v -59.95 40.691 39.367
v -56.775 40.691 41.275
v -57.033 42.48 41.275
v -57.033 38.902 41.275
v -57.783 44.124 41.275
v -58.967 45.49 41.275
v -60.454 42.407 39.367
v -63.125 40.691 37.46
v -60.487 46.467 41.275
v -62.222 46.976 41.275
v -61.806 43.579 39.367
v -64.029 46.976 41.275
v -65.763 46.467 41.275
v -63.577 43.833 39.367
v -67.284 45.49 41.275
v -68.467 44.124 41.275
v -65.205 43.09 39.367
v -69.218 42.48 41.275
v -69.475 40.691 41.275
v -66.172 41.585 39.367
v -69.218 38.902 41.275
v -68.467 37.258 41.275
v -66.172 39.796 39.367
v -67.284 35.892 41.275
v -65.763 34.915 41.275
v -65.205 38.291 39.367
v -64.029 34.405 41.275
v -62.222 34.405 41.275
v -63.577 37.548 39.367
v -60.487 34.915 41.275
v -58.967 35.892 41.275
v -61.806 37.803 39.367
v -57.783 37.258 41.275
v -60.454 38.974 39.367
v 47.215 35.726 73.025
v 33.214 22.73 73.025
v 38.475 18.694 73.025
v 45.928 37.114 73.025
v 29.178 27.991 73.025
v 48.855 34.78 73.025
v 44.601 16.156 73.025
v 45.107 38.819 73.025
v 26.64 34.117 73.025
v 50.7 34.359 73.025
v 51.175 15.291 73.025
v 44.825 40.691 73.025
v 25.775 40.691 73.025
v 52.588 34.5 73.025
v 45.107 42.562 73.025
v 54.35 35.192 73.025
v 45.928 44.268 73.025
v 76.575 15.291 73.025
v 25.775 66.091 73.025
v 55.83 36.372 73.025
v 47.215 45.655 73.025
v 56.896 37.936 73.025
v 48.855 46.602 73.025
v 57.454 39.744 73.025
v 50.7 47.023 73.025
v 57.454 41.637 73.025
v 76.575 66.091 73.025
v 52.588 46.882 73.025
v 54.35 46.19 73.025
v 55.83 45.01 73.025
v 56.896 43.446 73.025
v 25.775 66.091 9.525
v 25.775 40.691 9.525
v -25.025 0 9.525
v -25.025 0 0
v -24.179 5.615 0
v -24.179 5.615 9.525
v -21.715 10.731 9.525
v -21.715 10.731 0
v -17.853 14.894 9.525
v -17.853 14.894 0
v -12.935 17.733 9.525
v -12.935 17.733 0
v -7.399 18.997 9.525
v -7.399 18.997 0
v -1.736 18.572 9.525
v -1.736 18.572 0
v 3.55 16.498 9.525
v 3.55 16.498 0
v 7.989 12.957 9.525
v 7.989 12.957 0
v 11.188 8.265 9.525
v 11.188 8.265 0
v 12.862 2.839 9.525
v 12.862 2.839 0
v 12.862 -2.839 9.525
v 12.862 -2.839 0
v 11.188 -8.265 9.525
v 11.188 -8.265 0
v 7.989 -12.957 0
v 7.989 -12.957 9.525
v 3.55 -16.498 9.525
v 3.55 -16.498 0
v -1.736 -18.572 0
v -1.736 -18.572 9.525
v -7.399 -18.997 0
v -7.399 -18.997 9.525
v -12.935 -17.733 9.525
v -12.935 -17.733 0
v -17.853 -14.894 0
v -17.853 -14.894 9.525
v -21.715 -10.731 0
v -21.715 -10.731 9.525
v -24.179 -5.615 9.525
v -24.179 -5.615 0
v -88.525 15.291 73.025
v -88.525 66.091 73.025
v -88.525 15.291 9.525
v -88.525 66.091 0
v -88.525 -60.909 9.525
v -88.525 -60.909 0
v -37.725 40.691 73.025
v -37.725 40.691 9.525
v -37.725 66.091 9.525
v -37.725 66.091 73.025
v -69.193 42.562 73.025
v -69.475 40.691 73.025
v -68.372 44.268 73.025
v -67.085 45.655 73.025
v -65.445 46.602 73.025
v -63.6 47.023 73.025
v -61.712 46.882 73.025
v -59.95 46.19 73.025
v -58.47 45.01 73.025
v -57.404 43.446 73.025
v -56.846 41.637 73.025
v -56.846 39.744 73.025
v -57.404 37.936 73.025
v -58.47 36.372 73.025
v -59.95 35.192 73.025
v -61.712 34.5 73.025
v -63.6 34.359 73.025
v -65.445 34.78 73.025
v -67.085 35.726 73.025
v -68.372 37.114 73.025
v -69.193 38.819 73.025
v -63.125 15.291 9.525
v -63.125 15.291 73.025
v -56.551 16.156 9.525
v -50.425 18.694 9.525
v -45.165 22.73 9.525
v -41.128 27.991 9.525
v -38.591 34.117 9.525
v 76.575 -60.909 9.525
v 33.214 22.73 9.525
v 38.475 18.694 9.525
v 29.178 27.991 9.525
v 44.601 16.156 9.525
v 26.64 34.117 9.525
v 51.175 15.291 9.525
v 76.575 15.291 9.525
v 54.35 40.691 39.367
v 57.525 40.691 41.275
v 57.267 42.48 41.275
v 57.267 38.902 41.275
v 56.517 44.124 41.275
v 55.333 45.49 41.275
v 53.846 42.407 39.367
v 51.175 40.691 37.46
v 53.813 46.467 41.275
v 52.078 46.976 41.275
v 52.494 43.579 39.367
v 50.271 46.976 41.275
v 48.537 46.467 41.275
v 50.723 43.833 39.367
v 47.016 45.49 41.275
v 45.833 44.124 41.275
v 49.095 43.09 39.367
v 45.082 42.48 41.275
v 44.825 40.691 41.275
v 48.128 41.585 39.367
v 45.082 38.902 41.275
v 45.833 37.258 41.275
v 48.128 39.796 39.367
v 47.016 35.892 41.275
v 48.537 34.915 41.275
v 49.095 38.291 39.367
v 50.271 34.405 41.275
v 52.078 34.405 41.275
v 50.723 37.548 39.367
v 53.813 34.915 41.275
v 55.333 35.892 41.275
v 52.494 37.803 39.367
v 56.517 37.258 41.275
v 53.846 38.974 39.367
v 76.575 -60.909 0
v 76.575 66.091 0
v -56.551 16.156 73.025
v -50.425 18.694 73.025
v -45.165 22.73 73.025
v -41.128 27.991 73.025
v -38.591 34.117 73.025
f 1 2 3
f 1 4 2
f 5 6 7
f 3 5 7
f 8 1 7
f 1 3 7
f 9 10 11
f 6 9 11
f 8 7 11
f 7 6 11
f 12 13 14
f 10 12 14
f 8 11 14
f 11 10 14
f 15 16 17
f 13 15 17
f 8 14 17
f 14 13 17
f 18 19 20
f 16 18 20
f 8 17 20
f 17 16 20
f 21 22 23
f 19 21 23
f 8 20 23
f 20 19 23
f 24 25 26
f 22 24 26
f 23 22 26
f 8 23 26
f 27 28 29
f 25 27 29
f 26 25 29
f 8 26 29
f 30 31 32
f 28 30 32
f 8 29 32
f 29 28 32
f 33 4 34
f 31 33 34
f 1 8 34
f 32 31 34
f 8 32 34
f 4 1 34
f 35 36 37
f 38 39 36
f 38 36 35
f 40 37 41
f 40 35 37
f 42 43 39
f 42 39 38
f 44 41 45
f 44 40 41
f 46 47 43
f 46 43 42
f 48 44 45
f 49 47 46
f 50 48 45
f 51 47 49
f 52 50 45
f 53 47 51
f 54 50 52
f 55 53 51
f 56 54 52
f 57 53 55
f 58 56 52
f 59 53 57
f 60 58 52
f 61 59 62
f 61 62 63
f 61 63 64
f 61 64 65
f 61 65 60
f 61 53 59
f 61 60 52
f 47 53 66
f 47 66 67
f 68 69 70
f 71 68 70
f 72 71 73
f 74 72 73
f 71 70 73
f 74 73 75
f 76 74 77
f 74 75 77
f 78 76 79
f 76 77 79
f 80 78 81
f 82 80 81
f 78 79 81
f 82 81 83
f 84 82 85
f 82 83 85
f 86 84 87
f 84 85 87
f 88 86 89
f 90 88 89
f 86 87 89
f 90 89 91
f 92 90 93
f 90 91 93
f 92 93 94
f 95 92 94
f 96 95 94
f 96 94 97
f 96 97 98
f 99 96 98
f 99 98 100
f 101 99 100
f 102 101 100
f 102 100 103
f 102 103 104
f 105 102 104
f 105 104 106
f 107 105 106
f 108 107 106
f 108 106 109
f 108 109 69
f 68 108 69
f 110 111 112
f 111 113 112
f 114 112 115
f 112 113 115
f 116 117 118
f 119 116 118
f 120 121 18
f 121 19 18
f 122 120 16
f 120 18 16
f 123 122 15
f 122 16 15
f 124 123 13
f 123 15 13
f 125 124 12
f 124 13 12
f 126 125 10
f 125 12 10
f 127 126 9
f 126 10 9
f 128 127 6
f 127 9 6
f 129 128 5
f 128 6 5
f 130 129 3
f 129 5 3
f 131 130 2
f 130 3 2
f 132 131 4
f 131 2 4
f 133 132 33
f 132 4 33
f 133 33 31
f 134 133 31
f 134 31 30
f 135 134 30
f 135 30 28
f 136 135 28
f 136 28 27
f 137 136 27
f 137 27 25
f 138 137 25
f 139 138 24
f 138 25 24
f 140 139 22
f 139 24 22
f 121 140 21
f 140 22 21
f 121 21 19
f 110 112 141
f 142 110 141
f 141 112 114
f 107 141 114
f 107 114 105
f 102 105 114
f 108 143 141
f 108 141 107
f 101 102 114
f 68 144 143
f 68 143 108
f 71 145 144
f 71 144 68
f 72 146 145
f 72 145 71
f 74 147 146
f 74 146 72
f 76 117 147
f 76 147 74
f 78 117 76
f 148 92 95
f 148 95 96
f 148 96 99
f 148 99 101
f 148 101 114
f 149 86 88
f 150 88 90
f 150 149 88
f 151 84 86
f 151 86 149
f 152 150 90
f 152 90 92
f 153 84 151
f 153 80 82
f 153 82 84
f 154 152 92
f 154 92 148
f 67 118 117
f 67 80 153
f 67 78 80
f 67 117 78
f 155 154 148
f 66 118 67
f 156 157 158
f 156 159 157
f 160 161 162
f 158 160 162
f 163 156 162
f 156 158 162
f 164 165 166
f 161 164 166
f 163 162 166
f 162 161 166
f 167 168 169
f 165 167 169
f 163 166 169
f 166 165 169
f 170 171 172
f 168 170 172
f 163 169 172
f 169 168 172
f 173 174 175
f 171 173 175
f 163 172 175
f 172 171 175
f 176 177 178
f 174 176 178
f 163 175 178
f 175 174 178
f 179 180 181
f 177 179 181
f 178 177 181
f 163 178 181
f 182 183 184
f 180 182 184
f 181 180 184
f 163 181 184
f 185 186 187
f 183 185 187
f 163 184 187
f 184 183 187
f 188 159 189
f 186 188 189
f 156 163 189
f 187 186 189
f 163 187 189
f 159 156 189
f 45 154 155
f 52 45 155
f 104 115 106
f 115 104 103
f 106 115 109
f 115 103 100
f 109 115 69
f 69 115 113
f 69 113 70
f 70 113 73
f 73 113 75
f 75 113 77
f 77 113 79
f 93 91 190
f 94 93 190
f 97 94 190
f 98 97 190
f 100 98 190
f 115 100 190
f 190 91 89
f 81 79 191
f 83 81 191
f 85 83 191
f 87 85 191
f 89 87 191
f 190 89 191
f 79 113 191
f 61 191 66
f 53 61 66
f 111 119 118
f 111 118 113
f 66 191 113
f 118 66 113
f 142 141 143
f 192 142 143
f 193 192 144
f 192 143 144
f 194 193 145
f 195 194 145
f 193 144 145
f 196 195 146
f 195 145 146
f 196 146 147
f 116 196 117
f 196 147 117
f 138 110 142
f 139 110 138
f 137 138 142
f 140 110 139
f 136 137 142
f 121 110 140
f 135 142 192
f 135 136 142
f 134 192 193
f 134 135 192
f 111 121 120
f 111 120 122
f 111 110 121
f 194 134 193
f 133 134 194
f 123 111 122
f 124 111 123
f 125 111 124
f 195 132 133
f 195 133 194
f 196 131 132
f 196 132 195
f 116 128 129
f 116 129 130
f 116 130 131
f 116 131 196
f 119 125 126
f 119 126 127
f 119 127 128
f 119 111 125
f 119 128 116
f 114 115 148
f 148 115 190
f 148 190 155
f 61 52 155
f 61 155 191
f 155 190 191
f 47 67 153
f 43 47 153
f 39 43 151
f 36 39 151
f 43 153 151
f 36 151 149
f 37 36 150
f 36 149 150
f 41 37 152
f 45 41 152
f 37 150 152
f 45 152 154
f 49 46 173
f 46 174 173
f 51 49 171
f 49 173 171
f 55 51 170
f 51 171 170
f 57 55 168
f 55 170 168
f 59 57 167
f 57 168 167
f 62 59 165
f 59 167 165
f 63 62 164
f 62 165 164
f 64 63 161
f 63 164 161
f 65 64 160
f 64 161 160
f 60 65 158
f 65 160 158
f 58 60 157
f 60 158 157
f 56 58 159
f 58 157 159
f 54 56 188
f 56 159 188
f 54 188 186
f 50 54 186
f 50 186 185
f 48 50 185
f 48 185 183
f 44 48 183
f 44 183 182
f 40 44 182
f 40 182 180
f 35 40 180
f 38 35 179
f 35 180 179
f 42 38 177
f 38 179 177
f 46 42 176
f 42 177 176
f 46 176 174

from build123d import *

# Parameters (mm, degrees)
F0_W     = 165.1
F0_H     = 127
F1_DEPTH = 9.525
F3_DEPTH = 63.5
F5_D     = 12.7
F5_DEPTH = 31.75
F5_TIP   = 3.8154649308
F7_D     = 12.7
F7_DEPTH = 31.75
F7_TIP   = 3.8154649308
F9_D     = 38.1


with BuildPart() as f1:
    # F0 (on Top) → F1 (new body)
    with BuildSketch(Plane.XY):
        with Locations((-5.9753443556, 2.5908015668)):
            Rectangle(F0_W, F0_H)
    extrude(amount=F1_DEPTH)

    # F2 (on face) → F3 (join)
    with BuildSketch(Plane.XY.offset(9.525)):
        with BuildLine():
            Line((-37.7253443556, 66.0908015668), (-88.5253443556, 66.0908015668))
            Line((-88.5253443556, 66.0908015668), (-88.5253443556, 15.2908015668))
            Line((-88.5253443556, 15.2908015668), (-63.1253443556, 15.2908015668))
            ThreePointArc((-63.1253443556, 15.2908015668), (-45.1648321135, 22.7302893247), (-37.7253443556, 40.6908015668))
            Line((-37.7253443556, 40.6908015668), (-37.7253443556, 66.0908015668))
        make_face()
        with BuildLine():
            Line((76.5746556444, 66.0908015668), (25.7746556444, 66.0908015668))
            Line((25.7746556444, 66.0908015668), (25.7746556444, 40.6908015668))
            ThreePointArc((25.7746556444, 40.6908015668), (33.2141434022, 22.7302893247), (51.1746556444, 15.2908015668))
            Line((51.1746556444, 15.2908015668), (76.5746556444, 15.2908015668))
            Line((76.5746556444, 15.2908015668), (76.5746556444, 66.0908015668))
        make_face()
    extrude(amount=F3_DEPTH)

    # F5
    with Locations(Plane.XY.offset(73.025)):
        with Locations((-63.1253443556, 40.6908015668)):
            Hole(F5_D / 2, depth=F5_DEPTH)
            with Locations((0, 0, -(F5_DEPTH + F5_TIP / 2))):  # 118° drill point
                Cone(0, F5_D / 2, F5_TIP, mode=Mode.SUBTRACT)

    # F7
    with Locations(Plane.XY.offset(73.025)):
        with Locations((51.1746556444, 40.6908015668)):
            Hole(F7_D / 2, depth=F7_DEPTH)
            with Locations((0, 0, -(F7_DEPTH + F7_TIP / 2))):  # 118° drill point
                Cone(0, F7_D / 2, F7_TIP, mode=Mode.SUBTRACT)

    # F9 (through all)
    with Locations(Plane.XY.offset(9.525)):
        with Locations((-5.9753443556, 0)):
            Hole(F9_D / 2)


solid = f1.part
